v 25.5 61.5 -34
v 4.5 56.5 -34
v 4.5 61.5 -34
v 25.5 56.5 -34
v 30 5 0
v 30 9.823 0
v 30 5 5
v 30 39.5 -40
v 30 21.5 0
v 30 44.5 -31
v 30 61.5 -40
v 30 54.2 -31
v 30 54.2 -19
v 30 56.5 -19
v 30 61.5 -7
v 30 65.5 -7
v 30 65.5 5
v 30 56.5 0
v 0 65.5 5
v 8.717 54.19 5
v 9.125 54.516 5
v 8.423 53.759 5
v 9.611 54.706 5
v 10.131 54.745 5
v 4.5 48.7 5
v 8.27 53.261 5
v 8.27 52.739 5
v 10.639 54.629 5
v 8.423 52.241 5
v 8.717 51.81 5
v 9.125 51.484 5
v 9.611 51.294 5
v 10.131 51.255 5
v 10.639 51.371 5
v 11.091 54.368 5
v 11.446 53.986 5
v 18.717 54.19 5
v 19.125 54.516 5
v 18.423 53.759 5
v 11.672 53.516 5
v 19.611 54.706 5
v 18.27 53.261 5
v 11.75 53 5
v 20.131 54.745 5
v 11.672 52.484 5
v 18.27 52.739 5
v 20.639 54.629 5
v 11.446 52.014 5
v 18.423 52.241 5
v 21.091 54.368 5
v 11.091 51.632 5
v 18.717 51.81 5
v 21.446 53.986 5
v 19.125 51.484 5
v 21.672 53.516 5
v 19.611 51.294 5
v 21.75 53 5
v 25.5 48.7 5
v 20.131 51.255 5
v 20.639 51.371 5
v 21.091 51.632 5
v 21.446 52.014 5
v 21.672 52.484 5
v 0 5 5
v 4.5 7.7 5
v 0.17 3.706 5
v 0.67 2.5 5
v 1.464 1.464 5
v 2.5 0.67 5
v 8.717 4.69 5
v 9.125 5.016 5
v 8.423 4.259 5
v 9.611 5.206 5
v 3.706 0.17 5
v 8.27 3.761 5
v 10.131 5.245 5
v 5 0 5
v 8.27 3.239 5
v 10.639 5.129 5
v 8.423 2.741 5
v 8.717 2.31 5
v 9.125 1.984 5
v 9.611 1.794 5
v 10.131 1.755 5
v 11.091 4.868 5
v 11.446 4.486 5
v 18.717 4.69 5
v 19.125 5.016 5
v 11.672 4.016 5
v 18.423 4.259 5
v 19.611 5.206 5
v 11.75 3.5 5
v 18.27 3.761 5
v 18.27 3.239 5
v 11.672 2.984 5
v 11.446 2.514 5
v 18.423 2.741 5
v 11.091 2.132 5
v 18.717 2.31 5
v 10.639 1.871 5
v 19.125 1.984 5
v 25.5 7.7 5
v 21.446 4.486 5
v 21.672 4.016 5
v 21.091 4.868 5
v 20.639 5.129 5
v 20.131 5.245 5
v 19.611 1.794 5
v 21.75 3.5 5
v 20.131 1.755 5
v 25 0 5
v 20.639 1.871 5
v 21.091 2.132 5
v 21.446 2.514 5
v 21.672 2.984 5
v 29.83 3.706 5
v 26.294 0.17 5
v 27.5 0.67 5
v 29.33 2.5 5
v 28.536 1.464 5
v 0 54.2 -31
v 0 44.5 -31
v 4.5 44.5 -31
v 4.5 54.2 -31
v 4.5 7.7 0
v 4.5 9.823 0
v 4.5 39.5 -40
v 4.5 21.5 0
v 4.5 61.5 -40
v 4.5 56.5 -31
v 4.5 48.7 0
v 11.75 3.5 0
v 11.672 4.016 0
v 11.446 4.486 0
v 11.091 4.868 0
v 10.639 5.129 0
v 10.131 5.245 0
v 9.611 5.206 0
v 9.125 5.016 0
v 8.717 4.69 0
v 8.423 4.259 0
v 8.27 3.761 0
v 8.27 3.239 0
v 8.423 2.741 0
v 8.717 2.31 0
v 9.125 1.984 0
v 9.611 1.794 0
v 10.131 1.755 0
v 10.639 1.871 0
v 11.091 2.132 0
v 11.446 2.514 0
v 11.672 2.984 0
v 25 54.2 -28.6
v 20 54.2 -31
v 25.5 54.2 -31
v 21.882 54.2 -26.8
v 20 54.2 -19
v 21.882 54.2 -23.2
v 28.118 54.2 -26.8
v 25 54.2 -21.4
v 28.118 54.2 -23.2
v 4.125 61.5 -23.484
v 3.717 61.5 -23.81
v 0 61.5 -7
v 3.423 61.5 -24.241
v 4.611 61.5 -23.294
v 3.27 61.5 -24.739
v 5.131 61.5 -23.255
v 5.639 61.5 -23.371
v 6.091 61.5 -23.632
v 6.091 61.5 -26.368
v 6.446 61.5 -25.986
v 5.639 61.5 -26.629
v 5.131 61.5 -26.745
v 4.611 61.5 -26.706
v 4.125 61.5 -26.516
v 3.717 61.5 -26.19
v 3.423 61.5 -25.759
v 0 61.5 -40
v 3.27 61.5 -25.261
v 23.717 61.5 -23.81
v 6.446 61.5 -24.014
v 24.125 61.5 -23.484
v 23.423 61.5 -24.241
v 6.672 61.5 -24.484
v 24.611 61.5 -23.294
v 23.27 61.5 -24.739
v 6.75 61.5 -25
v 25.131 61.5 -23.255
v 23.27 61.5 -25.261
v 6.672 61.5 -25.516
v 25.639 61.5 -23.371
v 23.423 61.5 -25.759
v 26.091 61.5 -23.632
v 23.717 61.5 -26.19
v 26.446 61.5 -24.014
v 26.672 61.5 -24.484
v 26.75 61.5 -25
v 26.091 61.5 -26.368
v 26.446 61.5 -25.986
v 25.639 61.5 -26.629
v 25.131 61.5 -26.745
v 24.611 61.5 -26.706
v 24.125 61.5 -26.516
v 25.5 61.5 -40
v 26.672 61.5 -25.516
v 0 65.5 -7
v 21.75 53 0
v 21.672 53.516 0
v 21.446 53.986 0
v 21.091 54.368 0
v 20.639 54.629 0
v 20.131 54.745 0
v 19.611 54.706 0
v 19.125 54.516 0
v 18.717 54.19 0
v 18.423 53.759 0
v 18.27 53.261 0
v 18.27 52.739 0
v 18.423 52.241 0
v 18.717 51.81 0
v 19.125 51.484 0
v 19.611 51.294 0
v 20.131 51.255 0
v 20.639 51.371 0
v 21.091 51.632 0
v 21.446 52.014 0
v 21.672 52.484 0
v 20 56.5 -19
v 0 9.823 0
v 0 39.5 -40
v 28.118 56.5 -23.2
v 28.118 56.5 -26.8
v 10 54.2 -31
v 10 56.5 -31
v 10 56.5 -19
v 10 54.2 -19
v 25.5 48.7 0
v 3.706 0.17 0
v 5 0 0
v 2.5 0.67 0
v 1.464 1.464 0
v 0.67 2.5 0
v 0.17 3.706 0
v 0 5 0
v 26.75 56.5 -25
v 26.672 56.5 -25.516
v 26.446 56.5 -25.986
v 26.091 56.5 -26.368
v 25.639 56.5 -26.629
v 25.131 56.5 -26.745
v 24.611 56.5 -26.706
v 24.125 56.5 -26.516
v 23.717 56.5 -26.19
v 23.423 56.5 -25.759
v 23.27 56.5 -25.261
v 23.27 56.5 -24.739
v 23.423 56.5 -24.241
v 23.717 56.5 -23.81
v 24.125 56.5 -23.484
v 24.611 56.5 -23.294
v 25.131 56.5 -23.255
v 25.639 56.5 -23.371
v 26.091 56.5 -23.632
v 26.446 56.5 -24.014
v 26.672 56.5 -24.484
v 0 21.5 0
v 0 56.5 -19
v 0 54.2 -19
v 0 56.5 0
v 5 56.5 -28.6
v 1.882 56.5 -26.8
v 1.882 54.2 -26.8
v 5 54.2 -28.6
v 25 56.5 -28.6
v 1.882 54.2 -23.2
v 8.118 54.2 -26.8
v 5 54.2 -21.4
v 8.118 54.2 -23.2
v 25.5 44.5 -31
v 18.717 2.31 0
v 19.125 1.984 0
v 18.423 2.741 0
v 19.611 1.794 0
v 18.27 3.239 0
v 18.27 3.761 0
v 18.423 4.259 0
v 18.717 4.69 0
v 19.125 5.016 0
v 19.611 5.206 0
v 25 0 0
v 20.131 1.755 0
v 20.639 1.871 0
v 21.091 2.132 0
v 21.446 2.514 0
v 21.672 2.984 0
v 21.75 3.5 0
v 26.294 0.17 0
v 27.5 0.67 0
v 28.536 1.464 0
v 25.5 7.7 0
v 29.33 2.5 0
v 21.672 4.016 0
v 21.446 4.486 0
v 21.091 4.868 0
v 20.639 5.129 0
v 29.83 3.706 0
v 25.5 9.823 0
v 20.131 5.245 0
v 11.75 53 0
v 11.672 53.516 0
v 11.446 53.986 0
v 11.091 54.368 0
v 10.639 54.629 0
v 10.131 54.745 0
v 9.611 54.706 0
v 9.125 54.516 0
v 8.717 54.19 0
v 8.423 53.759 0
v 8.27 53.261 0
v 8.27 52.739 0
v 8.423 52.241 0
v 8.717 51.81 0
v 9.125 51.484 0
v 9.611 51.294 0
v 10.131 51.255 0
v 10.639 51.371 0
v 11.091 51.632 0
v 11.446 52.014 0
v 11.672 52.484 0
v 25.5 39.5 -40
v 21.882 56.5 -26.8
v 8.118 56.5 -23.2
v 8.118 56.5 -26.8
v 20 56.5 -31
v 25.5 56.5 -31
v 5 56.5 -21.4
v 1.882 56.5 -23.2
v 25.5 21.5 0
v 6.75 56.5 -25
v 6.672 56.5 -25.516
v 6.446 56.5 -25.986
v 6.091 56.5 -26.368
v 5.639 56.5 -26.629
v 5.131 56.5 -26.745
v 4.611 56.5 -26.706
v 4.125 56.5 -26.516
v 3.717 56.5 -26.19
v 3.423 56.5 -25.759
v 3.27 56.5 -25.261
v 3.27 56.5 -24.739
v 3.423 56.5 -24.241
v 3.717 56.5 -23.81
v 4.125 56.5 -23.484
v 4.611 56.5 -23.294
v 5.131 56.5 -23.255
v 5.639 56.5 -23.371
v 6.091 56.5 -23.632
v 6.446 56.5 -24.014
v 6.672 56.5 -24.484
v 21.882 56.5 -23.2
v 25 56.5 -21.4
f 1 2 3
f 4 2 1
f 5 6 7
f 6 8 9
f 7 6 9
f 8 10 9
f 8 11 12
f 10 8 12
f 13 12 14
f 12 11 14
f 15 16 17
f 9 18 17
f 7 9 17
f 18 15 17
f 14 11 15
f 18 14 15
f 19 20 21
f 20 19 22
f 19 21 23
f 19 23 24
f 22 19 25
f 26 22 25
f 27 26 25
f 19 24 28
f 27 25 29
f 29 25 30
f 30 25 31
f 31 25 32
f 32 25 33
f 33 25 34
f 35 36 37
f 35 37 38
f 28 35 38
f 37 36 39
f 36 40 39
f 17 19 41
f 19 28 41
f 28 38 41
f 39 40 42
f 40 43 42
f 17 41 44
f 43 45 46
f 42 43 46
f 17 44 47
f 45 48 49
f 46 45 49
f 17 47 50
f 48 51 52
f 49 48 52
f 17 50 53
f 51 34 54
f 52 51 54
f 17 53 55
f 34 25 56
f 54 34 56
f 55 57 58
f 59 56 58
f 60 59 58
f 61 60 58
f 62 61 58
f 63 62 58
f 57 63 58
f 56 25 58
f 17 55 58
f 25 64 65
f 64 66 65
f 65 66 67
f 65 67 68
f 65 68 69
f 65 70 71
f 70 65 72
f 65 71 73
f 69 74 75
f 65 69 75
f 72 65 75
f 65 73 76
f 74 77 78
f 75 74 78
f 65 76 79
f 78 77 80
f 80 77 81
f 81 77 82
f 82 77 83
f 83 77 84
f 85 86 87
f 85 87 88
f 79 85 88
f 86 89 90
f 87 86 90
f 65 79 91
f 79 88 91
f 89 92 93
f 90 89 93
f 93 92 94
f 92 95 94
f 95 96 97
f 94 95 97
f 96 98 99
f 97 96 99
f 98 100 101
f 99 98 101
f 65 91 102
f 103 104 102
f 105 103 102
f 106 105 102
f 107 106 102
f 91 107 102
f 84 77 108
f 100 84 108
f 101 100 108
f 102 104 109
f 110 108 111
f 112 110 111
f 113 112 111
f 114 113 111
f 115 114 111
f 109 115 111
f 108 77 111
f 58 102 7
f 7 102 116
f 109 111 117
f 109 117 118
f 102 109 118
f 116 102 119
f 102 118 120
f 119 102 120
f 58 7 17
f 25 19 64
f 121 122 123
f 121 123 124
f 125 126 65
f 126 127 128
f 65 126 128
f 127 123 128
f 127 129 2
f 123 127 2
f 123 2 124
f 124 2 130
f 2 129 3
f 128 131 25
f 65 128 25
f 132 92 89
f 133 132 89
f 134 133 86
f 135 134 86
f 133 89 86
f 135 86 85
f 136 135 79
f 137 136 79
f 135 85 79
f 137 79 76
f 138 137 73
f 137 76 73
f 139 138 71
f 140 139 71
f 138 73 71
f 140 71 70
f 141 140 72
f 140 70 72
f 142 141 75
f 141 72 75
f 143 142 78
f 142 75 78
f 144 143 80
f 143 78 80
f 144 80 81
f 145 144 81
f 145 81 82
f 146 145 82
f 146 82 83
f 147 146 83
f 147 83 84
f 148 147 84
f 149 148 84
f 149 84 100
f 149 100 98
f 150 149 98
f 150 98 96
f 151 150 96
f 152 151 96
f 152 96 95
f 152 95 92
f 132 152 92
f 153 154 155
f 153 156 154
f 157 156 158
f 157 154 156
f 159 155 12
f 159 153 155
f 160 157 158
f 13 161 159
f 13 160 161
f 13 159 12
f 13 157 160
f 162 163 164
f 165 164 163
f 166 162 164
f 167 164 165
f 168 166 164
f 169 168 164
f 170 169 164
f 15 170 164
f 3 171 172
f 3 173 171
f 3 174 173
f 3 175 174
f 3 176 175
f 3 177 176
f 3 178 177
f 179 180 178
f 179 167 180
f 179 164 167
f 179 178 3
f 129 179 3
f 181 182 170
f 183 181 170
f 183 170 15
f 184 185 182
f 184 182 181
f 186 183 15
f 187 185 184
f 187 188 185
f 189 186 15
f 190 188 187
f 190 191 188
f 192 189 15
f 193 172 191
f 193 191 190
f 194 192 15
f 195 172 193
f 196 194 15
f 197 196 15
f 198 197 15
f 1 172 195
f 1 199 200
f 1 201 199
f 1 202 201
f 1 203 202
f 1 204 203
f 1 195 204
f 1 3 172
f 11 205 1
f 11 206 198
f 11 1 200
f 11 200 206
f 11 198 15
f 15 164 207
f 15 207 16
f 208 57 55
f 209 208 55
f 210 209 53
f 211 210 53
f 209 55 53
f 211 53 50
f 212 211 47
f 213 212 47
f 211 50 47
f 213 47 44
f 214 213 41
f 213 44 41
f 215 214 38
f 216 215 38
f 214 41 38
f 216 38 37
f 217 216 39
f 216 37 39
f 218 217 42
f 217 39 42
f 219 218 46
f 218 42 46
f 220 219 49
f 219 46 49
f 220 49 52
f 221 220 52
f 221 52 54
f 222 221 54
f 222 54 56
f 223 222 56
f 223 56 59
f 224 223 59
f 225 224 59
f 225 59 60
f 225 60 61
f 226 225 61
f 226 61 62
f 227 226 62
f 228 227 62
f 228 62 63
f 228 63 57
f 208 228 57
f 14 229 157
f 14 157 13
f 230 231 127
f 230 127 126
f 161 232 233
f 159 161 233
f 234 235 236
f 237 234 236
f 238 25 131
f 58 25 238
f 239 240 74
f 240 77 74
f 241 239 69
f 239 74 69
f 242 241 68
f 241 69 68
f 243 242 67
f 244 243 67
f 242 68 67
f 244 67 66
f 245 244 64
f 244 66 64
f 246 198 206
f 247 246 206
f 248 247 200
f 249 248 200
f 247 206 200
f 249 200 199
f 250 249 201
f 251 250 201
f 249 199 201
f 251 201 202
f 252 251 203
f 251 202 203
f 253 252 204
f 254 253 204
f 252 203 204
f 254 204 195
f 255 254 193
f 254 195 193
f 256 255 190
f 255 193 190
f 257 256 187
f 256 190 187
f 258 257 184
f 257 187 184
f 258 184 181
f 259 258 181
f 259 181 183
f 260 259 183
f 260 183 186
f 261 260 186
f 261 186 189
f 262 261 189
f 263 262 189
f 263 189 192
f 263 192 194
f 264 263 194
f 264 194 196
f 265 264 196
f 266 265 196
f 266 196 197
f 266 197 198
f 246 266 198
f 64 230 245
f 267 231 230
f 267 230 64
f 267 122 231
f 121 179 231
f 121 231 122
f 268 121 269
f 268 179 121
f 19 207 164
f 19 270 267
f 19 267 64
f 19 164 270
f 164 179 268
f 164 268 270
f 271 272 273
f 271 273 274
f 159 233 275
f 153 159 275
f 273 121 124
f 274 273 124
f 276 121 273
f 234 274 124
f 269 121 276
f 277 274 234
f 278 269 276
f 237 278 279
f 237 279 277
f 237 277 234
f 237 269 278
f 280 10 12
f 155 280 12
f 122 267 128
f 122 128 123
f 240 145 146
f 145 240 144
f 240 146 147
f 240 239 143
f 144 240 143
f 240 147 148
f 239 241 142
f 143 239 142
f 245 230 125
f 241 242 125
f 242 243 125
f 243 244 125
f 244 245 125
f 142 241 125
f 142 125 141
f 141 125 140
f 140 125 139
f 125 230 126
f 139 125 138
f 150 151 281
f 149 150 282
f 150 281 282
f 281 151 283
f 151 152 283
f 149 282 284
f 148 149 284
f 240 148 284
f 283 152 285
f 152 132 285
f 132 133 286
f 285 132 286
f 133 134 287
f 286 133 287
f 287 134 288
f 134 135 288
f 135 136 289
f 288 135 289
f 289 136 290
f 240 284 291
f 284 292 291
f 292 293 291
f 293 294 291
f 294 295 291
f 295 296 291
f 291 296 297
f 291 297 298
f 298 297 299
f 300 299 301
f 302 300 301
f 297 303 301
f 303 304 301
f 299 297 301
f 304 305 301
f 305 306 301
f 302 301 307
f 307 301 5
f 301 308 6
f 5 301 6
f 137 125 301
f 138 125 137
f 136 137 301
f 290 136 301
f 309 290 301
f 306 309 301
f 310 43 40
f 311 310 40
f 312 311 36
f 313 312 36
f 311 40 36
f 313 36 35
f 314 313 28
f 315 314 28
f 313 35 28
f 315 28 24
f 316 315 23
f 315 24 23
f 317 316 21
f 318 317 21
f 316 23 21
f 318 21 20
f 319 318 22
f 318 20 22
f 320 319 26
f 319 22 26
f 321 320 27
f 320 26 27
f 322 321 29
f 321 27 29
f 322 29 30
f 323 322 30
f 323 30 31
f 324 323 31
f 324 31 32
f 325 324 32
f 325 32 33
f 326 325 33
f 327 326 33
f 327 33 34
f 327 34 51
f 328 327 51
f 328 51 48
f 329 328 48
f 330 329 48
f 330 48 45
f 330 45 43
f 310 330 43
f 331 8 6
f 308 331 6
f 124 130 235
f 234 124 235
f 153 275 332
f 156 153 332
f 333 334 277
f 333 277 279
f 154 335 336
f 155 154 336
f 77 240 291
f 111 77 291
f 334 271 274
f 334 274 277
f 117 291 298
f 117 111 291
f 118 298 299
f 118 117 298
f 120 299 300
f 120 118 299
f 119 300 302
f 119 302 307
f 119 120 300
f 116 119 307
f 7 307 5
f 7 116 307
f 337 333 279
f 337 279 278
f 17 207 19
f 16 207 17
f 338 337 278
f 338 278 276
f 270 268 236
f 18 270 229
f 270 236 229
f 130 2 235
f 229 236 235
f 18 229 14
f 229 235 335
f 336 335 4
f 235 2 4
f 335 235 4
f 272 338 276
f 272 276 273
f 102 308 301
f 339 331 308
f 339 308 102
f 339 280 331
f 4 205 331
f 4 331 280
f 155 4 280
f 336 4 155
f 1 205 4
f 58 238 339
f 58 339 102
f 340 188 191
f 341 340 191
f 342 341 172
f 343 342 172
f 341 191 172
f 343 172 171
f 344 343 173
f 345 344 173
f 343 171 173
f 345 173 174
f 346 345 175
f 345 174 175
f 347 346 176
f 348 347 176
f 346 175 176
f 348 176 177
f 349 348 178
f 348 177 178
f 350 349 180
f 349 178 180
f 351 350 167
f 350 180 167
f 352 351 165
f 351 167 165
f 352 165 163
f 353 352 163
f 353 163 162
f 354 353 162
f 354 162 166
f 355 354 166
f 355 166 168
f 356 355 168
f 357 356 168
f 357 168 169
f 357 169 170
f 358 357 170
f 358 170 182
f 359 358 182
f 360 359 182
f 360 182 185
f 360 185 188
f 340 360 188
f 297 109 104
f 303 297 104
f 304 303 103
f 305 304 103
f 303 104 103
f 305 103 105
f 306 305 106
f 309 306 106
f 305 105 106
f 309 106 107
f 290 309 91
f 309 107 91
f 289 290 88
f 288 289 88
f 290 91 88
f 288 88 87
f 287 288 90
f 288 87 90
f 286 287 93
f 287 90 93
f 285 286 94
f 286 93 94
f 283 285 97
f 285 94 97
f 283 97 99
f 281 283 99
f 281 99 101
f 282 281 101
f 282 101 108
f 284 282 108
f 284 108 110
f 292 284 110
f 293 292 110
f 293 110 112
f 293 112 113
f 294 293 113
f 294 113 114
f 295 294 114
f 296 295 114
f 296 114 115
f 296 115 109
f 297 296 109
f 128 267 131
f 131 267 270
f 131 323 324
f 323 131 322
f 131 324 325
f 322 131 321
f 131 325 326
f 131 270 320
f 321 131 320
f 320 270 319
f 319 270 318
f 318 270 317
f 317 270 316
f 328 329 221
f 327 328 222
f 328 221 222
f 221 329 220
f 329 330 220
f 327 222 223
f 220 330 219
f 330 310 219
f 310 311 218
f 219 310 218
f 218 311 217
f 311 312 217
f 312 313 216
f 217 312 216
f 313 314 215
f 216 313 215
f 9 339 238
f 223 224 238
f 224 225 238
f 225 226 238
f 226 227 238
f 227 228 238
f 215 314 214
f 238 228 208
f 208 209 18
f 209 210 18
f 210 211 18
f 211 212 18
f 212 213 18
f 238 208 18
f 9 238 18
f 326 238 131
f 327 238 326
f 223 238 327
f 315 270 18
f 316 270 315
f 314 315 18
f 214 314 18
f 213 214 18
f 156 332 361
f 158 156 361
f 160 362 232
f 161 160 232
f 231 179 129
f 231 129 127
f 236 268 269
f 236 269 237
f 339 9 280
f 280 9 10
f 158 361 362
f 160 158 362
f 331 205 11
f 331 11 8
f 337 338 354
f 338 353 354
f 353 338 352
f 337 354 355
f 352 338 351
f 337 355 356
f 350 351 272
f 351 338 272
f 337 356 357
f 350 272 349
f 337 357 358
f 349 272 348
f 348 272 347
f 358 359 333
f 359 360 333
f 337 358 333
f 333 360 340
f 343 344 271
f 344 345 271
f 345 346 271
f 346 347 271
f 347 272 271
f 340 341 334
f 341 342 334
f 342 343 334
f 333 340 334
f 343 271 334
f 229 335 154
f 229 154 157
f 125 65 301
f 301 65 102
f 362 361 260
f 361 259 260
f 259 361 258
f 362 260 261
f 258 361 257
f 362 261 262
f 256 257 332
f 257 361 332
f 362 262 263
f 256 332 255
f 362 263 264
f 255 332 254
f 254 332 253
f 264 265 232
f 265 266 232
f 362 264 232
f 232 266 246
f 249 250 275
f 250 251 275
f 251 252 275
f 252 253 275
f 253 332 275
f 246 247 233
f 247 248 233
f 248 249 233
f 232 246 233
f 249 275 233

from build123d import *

# Parameters (mm, degrees)
SKETCH_1_W          = 30
SKETCH_1_H          = 61.5
EXTRUDE_1_DEPTH     = 5
SKETCH_2_R          = 1.75
SKETCH_2_W          = 21
SKETCH_2_H          = 41
CUT_EXTRUDE_1_DEPTH = 6
SKETCH_3_W          = 30
SKETCH_3_H          = 40
EXTRUDE_2_DEPTH     = 5
SKETCH_4_R          = 1.75
CUT_EXTRUDE_2_DEPTH = 62.5
SKETCH_5_W          = 10
SKETCH_5_H          = 12
EXTRUDE_3_DEPTH     = 2.3
SKETCH_6_W          = 30
SKETCH_6_H          = 12
EXTRUDE_4_DEPTH     = 4
EXTRUDE_5_DEPTH     = 4.5
FILLET_1_R          = 5
SKETCH_8_W          = 21
SKETCH_8_H          = 6
CUT_EXTRUDE_3_DEPTH = 10


with BuildPart() as part:
    # ｽｹｯﾁ1 → ﾎﾞｽ - 押し出し1 (new body)
    with BuildSketch(Plane.XY):
        with Locations((15, 30.75)):
            Rectangle(SKETCH_1_W, SKETCH_1_H)
    extrude(amount=EXTRUDE_1_DEPTH)

    # ｽｹｯﾁ2 → ｶｯﾄ - 押し出し1 (cut, through all)
    with BuildSketch(Plane.XY.offset(5)):
        with Locations((10, 3.5)):
            Circle(SKETCH_2_R)
        with Locations((20, 3.5)):
            Circle(SKETCH_2_R)
        with Locations((10, 53)):
            Circle(SKETCH_2_R)
        with Locations((20, 53)):
            Circle(SKETCH_2_R)
        with Locations((15, 28.2)):
            Rectangle(SKETCH_2_W, SKETCH_2_H)
    extrude(amount=-CUT_EXTRUDE_1_DEPTH, mode=Mode.SUBTRACT)

    # ｽｹｯﾁ3 → ﾎﾞｽ - 押し出し2 (add)
    with BuildSketch(Plane(origin=(0, 61.5, 0), x_dir=(1, 0, 0), z_dir=(0, 1, 0))):
        with Locations((15, 20)):
            Rectangle(SKETCH_3_W, SKETCH_3_H)
    extrude(amount=-EXTRUDE_2_DEPTH)

    # ｽｹｯﾁ4 → ｶｯﾄ - 押し出し2 (cut, through all)
    with BuildSketch(Plane(origin=(0, 61.5, 0), x_dir=(1, 0, 0), z_dir=(0, 1, 0))):
        with Locations((5, 25)):
            Circle(SKETCH_4_R)
        with Locations((25, 25)):
            Circle(SKETCH_4_R)
    extrude(amount=-CUT_EXTRUDE_2_DEPTH, mode=Mode.SUBTRACT)

    # ｽｹｯﾁ5 → ﾎﾞｽ - 押し出し3 (add)
    with BuildSketch(Plane.XZ.offset(-56.5)):
        with Locations((5, -25)):
            Rectangle(SKETCH_5_W, SKETCH_5_H)
        Polygon((5, -28.6), (8.117691454, -26.8), (8.117691454, -23.2), (5, -21.4), (1.882308546, -23.2), (1.882308546, -26.8), align=None, mode=Mode.SUBTRACT)
        with Locations((25, -25)):
            Rectangle(SKETCH_5_W, SKETCH_5_H)
        Polygon((28.117691454, -26.8), (25, -28.6), (21.882308546, -26.8), (21.882308546, -23.2), (25, -21.4), (28.117691454, -23.2), align=None, mode=Mode.SUBTRACT)
    extrude(amount=EXTRUDE_3_DEPTH)

    # ｽｹｯﾁ6 → ﾎﾞｽ - 押し出し4 (add)
    with BuildSketch(Plane(origin=(0, 61.5, 0), x_dir=(1, 0, 0), z_dir=(0, 1, 0))):
        with Locations((15, 1)):
            Rectangle(SKETCH_6_W, SKETCH_6_H)
    extrude(amount=EXTRUDE_4_DEPTH)

    # ｽｹｯﾁ7 → ﾎﾞｽ - 押し出し5 (add)
    with BuildSketch(Plane(origin=(30, 0, 0), x_dir=(0, 0, -1), z_dir=(1, 0, 0))):
        Polygon((40, 56.5), (40, 39.5), (0, 9.822580645), (0, 21.5), (31, 44.5), (31, 56.5), align=None)
    extrude_5 = extrude(amount=-EXTRUDE_5_DEPTH)

    # ﾐﾗｰ1: ﾎﾞｽ - 押し出し5 across plane
    add(extrude_5.mirror(Plane.ZY.offset(-15)))

    # ﾌｨﾚｯﾄ1
    fillet_1_edges = [part.edges().sort_by_distance(p)[0] for p in [
        (30, 0, 2.5),
        (0, 0, 2.5),
    ]]
    fillet(fillet_1_edges, radius=FILLET_1_R)

    # ｽｹｯﾁ8 → ｶｯﾄ - 押し出し3 (cut, through all)
    with BuildSketch(Plane.XZ.offset(-56.5)):
        with Locations((15, -37)):
            Rectangle(SKETCH_8_W, SKETCH_8_H)
    extrude(amount=-CUT_EXTRUDE_3_DEPTH, mode=Mode.SUBTRACT)


solid = part.part
